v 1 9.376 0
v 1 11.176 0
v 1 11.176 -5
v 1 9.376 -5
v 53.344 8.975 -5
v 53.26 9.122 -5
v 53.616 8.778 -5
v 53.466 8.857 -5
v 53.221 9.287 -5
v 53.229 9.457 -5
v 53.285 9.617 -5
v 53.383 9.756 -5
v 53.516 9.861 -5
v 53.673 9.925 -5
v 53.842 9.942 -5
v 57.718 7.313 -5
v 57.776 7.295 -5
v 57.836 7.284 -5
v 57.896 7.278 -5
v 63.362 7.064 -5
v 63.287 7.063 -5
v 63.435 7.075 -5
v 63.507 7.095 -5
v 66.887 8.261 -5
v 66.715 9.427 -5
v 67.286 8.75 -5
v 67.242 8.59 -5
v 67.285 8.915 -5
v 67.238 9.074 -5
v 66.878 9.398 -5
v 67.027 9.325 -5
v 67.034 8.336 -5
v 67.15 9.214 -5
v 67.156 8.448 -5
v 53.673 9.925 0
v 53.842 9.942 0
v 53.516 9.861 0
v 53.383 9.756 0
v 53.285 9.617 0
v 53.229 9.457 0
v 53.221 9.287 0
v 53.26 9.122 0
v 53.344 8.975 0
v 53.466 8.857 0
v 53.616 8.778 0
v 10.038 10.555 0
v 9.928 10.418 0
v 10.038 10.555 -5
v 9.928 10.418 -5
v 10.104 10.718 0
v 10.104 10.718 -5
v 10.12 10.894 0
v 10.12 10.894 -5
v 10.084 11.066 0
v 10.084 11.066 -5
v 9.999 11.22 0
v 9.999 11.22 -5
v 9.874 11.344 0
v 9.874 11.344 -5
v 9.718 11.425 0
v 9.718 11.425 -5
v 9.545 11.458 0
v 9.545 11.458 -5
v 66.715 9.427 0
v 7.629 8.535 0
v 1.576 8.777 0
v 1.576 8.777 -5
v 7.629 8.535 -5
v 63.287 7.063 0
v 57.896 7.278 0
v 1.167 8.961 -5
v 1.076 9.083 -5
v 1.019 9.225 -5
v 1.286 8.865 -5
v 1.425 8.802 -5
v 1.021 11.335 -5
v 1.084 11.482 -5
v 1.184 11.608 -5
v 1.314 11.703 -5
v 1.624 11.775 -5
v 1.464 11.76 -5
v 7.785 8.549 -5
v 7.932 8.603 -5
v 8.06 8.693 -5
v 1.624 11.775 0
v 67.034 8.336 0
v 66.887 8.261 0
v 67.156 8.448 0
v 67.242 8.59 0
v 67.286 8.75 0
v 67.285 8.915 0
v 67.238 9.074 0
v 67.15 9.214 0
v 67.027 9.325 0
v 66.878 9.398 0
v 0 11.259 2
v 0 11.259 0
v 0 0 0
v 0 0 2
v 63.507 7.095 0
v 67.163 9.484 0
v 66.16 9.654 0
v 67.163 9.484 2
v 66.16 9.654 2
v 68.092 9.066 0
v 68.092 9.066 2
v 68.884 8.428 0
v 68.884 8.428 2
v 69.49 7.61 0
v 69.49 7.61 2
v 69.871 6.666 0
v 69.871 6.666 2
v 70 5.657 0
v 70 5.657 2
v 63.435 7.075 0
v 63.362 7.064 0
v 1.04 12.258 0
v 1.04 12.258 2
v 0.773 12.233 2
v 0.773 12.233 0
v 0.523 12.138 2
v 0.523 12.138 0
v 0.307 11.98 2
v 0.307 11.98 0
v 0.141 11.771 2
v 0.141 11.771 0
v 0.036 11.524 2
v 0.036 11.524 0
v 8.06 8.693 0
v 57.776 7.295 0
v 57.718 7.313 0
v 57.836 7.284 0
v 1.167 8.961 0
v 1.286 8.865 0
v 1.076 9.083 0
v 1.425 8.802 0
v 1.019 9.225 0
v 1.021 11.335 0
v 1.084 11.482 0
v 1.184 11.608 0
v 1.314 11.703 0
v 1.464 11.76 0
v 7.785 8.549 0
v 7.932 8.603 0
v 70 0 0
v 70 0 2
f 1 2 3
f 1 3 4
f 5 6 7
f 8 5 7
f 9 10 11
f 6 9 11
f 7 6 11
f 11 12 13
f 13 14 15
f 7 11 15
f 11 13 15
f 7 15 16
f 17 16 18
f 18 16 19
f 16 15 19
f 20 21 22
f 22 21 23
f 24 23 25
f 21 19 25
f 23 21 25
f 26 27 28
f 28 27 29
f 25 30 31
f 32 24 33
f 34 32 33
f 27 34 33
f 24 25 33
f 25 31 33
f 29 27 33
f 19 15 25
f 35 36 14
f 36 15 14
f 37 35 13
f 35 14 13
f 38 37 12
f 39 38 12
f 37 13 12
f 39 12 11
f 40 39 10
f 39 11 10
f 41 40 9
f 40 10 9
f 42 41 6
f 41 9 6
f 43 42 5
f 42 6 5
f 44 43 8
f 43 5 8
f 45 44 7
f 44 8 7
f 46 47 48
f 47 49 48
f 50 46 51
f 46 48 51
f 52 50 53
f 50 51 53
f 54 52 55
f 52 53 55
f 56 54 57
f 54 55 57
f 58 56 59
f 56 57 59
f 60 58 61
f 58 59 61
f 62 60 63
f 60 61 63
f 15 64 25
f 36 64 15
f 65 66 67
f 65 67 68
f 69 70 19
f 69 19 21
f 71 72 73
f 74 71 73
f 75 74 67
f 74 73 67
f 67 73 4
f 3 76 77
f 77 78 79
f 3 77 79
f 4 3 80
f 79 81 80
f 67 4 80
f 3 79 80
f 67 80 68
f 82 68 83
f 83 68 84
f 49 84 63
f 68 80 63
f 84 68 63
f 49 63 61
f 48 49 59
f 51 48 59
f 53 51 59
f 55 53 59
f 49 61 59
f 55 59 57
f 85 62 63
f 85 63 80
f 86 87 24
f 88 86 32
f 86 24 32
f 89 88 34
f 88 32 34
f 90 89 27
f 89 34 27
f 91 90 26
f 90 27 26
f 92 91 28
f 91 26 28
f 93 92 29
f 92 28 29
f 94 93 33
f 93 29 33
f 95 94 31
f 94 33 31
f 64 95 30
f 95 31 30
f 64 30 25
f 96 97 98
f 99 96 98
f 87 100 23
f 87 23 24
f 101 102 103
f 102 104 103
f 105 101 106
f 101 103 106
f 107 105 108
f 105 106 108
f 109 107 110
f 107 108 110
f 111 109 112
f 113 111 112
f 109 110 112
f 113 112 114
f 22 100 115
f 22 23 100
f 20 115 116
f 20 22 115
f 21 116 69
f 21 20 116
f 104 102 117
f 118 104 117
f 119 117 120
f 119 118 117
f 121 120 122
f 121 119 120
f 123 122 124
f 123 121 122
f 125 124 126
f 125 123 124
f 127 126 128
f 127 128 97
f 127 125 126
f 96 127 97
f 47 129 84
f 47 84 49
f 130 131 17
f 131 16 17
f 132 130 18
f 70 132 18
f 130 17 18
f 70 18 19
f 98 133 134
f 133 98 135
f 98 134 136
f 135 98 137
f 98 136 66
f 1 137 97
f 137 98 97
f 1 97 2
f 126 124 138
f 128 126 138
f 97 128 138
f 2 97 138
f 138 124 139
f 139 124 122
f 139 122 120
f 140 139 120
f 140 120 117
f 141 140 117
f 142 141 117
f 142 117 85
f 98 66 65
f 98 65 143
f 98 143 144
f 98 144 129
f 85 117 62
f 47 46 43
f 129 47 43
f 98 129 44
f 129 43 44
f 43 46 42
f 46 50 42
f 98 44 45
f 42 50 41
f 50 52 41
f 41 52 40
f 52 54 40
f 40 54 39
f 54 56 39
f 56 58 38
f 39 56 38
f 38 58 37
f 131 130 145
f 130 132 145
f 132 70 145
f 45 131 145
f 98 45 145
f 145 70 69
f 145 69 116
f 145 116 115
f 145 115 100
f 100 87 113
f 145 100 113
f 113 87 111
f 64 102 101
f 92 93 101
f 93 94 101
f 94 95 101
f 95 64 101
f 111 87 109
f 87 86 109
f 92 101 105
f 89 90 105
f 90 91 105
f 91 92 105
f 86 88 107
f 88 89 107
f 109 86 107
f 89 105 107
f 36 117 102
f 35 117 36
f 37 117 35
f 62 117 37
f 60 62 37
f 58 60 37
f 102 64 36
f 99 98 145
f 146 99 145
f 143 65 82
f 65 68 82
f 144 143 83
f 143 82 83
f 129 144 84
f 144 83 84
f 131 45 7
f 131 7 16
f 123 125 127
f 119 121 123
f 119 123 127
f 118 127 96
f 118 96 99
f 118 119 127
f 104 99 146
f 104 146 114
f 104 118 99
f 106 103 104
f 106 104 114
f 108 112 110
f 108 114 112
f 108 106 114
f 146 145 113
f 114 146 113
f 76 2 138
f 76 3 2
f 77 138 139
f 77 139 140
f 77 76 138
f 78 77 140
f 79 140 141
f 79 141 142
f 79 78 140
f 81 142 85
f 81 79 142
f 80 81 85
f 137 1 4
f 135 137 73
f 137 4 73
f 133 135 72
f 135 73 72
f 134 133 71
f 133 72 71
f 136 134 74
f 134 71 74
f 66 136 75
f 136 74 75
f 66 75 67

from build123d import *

# Parameters (mm, degrees)
F1_DEPTH = 2
F3_DEPTH = 7
F4_R     = 0.6
F5_R     = 4
F6_R     = 1


# Not quite as in the source:
# - a feature of the source that left no trace in its solid (it failed there, or was rolled back) is left out


with BuildPart() as f1:
    # F0 (on Top) → F1 (new body)
    with BuildSketch(Plane.XY):
        Polygon((0, 12.3), (0, 0), (70, 0), (70, 9.5), align=None)
    extrude(amount=F1_DEPTH)

    # F2 (on face) → F3 (join)
    with BuildSketch(Plane.XY.offset(2)):
        Polygon((1, 11.8), (1, 8.8), (7.8769936128, 8.5249202555), (10.9920095872, 11.4003196165), align=None)
        Polygon((63.4, 7.0580007994), (69.9, 9.3), (49.9159808256, 10.099360767), (57.8044746312, 7.2818218141), align=None)
    extrude(amount=-F3_DEPTH)

    # F4
    f4_edges = [f1.edges().sort_by_distance(p)[0] for p in [
        (1, 11.8, -2.5),
        (10.99201, 11.40032, -2.5),
        (69.9, 9.3, -2.5),
        (49.915981, 10.099361, -2.5),
        (63.4, 7.058001, -2.5),
        (57.804475, 7.281822, -2.5),
        (1, 8.8, -2.5),
        (7.876994, 8.52492, -2.5),
    ]]
    fillet(f4_edges, radius=F4_R)

    # F5
    f5_edges = [f1.edges().sort_by_distance(p)[0] for p in [
        (70, 9.5, 1),
    ]]
    fillet(f5_edges, radius=F5_R)

    # F6
    f6_edges = [f1.edges().sort_by_distance(p)[0] for p in [
        (0, 12.3, 1),
    ]]
    fillet(f6_edges, radius=F6_R)


solid = f1.part
